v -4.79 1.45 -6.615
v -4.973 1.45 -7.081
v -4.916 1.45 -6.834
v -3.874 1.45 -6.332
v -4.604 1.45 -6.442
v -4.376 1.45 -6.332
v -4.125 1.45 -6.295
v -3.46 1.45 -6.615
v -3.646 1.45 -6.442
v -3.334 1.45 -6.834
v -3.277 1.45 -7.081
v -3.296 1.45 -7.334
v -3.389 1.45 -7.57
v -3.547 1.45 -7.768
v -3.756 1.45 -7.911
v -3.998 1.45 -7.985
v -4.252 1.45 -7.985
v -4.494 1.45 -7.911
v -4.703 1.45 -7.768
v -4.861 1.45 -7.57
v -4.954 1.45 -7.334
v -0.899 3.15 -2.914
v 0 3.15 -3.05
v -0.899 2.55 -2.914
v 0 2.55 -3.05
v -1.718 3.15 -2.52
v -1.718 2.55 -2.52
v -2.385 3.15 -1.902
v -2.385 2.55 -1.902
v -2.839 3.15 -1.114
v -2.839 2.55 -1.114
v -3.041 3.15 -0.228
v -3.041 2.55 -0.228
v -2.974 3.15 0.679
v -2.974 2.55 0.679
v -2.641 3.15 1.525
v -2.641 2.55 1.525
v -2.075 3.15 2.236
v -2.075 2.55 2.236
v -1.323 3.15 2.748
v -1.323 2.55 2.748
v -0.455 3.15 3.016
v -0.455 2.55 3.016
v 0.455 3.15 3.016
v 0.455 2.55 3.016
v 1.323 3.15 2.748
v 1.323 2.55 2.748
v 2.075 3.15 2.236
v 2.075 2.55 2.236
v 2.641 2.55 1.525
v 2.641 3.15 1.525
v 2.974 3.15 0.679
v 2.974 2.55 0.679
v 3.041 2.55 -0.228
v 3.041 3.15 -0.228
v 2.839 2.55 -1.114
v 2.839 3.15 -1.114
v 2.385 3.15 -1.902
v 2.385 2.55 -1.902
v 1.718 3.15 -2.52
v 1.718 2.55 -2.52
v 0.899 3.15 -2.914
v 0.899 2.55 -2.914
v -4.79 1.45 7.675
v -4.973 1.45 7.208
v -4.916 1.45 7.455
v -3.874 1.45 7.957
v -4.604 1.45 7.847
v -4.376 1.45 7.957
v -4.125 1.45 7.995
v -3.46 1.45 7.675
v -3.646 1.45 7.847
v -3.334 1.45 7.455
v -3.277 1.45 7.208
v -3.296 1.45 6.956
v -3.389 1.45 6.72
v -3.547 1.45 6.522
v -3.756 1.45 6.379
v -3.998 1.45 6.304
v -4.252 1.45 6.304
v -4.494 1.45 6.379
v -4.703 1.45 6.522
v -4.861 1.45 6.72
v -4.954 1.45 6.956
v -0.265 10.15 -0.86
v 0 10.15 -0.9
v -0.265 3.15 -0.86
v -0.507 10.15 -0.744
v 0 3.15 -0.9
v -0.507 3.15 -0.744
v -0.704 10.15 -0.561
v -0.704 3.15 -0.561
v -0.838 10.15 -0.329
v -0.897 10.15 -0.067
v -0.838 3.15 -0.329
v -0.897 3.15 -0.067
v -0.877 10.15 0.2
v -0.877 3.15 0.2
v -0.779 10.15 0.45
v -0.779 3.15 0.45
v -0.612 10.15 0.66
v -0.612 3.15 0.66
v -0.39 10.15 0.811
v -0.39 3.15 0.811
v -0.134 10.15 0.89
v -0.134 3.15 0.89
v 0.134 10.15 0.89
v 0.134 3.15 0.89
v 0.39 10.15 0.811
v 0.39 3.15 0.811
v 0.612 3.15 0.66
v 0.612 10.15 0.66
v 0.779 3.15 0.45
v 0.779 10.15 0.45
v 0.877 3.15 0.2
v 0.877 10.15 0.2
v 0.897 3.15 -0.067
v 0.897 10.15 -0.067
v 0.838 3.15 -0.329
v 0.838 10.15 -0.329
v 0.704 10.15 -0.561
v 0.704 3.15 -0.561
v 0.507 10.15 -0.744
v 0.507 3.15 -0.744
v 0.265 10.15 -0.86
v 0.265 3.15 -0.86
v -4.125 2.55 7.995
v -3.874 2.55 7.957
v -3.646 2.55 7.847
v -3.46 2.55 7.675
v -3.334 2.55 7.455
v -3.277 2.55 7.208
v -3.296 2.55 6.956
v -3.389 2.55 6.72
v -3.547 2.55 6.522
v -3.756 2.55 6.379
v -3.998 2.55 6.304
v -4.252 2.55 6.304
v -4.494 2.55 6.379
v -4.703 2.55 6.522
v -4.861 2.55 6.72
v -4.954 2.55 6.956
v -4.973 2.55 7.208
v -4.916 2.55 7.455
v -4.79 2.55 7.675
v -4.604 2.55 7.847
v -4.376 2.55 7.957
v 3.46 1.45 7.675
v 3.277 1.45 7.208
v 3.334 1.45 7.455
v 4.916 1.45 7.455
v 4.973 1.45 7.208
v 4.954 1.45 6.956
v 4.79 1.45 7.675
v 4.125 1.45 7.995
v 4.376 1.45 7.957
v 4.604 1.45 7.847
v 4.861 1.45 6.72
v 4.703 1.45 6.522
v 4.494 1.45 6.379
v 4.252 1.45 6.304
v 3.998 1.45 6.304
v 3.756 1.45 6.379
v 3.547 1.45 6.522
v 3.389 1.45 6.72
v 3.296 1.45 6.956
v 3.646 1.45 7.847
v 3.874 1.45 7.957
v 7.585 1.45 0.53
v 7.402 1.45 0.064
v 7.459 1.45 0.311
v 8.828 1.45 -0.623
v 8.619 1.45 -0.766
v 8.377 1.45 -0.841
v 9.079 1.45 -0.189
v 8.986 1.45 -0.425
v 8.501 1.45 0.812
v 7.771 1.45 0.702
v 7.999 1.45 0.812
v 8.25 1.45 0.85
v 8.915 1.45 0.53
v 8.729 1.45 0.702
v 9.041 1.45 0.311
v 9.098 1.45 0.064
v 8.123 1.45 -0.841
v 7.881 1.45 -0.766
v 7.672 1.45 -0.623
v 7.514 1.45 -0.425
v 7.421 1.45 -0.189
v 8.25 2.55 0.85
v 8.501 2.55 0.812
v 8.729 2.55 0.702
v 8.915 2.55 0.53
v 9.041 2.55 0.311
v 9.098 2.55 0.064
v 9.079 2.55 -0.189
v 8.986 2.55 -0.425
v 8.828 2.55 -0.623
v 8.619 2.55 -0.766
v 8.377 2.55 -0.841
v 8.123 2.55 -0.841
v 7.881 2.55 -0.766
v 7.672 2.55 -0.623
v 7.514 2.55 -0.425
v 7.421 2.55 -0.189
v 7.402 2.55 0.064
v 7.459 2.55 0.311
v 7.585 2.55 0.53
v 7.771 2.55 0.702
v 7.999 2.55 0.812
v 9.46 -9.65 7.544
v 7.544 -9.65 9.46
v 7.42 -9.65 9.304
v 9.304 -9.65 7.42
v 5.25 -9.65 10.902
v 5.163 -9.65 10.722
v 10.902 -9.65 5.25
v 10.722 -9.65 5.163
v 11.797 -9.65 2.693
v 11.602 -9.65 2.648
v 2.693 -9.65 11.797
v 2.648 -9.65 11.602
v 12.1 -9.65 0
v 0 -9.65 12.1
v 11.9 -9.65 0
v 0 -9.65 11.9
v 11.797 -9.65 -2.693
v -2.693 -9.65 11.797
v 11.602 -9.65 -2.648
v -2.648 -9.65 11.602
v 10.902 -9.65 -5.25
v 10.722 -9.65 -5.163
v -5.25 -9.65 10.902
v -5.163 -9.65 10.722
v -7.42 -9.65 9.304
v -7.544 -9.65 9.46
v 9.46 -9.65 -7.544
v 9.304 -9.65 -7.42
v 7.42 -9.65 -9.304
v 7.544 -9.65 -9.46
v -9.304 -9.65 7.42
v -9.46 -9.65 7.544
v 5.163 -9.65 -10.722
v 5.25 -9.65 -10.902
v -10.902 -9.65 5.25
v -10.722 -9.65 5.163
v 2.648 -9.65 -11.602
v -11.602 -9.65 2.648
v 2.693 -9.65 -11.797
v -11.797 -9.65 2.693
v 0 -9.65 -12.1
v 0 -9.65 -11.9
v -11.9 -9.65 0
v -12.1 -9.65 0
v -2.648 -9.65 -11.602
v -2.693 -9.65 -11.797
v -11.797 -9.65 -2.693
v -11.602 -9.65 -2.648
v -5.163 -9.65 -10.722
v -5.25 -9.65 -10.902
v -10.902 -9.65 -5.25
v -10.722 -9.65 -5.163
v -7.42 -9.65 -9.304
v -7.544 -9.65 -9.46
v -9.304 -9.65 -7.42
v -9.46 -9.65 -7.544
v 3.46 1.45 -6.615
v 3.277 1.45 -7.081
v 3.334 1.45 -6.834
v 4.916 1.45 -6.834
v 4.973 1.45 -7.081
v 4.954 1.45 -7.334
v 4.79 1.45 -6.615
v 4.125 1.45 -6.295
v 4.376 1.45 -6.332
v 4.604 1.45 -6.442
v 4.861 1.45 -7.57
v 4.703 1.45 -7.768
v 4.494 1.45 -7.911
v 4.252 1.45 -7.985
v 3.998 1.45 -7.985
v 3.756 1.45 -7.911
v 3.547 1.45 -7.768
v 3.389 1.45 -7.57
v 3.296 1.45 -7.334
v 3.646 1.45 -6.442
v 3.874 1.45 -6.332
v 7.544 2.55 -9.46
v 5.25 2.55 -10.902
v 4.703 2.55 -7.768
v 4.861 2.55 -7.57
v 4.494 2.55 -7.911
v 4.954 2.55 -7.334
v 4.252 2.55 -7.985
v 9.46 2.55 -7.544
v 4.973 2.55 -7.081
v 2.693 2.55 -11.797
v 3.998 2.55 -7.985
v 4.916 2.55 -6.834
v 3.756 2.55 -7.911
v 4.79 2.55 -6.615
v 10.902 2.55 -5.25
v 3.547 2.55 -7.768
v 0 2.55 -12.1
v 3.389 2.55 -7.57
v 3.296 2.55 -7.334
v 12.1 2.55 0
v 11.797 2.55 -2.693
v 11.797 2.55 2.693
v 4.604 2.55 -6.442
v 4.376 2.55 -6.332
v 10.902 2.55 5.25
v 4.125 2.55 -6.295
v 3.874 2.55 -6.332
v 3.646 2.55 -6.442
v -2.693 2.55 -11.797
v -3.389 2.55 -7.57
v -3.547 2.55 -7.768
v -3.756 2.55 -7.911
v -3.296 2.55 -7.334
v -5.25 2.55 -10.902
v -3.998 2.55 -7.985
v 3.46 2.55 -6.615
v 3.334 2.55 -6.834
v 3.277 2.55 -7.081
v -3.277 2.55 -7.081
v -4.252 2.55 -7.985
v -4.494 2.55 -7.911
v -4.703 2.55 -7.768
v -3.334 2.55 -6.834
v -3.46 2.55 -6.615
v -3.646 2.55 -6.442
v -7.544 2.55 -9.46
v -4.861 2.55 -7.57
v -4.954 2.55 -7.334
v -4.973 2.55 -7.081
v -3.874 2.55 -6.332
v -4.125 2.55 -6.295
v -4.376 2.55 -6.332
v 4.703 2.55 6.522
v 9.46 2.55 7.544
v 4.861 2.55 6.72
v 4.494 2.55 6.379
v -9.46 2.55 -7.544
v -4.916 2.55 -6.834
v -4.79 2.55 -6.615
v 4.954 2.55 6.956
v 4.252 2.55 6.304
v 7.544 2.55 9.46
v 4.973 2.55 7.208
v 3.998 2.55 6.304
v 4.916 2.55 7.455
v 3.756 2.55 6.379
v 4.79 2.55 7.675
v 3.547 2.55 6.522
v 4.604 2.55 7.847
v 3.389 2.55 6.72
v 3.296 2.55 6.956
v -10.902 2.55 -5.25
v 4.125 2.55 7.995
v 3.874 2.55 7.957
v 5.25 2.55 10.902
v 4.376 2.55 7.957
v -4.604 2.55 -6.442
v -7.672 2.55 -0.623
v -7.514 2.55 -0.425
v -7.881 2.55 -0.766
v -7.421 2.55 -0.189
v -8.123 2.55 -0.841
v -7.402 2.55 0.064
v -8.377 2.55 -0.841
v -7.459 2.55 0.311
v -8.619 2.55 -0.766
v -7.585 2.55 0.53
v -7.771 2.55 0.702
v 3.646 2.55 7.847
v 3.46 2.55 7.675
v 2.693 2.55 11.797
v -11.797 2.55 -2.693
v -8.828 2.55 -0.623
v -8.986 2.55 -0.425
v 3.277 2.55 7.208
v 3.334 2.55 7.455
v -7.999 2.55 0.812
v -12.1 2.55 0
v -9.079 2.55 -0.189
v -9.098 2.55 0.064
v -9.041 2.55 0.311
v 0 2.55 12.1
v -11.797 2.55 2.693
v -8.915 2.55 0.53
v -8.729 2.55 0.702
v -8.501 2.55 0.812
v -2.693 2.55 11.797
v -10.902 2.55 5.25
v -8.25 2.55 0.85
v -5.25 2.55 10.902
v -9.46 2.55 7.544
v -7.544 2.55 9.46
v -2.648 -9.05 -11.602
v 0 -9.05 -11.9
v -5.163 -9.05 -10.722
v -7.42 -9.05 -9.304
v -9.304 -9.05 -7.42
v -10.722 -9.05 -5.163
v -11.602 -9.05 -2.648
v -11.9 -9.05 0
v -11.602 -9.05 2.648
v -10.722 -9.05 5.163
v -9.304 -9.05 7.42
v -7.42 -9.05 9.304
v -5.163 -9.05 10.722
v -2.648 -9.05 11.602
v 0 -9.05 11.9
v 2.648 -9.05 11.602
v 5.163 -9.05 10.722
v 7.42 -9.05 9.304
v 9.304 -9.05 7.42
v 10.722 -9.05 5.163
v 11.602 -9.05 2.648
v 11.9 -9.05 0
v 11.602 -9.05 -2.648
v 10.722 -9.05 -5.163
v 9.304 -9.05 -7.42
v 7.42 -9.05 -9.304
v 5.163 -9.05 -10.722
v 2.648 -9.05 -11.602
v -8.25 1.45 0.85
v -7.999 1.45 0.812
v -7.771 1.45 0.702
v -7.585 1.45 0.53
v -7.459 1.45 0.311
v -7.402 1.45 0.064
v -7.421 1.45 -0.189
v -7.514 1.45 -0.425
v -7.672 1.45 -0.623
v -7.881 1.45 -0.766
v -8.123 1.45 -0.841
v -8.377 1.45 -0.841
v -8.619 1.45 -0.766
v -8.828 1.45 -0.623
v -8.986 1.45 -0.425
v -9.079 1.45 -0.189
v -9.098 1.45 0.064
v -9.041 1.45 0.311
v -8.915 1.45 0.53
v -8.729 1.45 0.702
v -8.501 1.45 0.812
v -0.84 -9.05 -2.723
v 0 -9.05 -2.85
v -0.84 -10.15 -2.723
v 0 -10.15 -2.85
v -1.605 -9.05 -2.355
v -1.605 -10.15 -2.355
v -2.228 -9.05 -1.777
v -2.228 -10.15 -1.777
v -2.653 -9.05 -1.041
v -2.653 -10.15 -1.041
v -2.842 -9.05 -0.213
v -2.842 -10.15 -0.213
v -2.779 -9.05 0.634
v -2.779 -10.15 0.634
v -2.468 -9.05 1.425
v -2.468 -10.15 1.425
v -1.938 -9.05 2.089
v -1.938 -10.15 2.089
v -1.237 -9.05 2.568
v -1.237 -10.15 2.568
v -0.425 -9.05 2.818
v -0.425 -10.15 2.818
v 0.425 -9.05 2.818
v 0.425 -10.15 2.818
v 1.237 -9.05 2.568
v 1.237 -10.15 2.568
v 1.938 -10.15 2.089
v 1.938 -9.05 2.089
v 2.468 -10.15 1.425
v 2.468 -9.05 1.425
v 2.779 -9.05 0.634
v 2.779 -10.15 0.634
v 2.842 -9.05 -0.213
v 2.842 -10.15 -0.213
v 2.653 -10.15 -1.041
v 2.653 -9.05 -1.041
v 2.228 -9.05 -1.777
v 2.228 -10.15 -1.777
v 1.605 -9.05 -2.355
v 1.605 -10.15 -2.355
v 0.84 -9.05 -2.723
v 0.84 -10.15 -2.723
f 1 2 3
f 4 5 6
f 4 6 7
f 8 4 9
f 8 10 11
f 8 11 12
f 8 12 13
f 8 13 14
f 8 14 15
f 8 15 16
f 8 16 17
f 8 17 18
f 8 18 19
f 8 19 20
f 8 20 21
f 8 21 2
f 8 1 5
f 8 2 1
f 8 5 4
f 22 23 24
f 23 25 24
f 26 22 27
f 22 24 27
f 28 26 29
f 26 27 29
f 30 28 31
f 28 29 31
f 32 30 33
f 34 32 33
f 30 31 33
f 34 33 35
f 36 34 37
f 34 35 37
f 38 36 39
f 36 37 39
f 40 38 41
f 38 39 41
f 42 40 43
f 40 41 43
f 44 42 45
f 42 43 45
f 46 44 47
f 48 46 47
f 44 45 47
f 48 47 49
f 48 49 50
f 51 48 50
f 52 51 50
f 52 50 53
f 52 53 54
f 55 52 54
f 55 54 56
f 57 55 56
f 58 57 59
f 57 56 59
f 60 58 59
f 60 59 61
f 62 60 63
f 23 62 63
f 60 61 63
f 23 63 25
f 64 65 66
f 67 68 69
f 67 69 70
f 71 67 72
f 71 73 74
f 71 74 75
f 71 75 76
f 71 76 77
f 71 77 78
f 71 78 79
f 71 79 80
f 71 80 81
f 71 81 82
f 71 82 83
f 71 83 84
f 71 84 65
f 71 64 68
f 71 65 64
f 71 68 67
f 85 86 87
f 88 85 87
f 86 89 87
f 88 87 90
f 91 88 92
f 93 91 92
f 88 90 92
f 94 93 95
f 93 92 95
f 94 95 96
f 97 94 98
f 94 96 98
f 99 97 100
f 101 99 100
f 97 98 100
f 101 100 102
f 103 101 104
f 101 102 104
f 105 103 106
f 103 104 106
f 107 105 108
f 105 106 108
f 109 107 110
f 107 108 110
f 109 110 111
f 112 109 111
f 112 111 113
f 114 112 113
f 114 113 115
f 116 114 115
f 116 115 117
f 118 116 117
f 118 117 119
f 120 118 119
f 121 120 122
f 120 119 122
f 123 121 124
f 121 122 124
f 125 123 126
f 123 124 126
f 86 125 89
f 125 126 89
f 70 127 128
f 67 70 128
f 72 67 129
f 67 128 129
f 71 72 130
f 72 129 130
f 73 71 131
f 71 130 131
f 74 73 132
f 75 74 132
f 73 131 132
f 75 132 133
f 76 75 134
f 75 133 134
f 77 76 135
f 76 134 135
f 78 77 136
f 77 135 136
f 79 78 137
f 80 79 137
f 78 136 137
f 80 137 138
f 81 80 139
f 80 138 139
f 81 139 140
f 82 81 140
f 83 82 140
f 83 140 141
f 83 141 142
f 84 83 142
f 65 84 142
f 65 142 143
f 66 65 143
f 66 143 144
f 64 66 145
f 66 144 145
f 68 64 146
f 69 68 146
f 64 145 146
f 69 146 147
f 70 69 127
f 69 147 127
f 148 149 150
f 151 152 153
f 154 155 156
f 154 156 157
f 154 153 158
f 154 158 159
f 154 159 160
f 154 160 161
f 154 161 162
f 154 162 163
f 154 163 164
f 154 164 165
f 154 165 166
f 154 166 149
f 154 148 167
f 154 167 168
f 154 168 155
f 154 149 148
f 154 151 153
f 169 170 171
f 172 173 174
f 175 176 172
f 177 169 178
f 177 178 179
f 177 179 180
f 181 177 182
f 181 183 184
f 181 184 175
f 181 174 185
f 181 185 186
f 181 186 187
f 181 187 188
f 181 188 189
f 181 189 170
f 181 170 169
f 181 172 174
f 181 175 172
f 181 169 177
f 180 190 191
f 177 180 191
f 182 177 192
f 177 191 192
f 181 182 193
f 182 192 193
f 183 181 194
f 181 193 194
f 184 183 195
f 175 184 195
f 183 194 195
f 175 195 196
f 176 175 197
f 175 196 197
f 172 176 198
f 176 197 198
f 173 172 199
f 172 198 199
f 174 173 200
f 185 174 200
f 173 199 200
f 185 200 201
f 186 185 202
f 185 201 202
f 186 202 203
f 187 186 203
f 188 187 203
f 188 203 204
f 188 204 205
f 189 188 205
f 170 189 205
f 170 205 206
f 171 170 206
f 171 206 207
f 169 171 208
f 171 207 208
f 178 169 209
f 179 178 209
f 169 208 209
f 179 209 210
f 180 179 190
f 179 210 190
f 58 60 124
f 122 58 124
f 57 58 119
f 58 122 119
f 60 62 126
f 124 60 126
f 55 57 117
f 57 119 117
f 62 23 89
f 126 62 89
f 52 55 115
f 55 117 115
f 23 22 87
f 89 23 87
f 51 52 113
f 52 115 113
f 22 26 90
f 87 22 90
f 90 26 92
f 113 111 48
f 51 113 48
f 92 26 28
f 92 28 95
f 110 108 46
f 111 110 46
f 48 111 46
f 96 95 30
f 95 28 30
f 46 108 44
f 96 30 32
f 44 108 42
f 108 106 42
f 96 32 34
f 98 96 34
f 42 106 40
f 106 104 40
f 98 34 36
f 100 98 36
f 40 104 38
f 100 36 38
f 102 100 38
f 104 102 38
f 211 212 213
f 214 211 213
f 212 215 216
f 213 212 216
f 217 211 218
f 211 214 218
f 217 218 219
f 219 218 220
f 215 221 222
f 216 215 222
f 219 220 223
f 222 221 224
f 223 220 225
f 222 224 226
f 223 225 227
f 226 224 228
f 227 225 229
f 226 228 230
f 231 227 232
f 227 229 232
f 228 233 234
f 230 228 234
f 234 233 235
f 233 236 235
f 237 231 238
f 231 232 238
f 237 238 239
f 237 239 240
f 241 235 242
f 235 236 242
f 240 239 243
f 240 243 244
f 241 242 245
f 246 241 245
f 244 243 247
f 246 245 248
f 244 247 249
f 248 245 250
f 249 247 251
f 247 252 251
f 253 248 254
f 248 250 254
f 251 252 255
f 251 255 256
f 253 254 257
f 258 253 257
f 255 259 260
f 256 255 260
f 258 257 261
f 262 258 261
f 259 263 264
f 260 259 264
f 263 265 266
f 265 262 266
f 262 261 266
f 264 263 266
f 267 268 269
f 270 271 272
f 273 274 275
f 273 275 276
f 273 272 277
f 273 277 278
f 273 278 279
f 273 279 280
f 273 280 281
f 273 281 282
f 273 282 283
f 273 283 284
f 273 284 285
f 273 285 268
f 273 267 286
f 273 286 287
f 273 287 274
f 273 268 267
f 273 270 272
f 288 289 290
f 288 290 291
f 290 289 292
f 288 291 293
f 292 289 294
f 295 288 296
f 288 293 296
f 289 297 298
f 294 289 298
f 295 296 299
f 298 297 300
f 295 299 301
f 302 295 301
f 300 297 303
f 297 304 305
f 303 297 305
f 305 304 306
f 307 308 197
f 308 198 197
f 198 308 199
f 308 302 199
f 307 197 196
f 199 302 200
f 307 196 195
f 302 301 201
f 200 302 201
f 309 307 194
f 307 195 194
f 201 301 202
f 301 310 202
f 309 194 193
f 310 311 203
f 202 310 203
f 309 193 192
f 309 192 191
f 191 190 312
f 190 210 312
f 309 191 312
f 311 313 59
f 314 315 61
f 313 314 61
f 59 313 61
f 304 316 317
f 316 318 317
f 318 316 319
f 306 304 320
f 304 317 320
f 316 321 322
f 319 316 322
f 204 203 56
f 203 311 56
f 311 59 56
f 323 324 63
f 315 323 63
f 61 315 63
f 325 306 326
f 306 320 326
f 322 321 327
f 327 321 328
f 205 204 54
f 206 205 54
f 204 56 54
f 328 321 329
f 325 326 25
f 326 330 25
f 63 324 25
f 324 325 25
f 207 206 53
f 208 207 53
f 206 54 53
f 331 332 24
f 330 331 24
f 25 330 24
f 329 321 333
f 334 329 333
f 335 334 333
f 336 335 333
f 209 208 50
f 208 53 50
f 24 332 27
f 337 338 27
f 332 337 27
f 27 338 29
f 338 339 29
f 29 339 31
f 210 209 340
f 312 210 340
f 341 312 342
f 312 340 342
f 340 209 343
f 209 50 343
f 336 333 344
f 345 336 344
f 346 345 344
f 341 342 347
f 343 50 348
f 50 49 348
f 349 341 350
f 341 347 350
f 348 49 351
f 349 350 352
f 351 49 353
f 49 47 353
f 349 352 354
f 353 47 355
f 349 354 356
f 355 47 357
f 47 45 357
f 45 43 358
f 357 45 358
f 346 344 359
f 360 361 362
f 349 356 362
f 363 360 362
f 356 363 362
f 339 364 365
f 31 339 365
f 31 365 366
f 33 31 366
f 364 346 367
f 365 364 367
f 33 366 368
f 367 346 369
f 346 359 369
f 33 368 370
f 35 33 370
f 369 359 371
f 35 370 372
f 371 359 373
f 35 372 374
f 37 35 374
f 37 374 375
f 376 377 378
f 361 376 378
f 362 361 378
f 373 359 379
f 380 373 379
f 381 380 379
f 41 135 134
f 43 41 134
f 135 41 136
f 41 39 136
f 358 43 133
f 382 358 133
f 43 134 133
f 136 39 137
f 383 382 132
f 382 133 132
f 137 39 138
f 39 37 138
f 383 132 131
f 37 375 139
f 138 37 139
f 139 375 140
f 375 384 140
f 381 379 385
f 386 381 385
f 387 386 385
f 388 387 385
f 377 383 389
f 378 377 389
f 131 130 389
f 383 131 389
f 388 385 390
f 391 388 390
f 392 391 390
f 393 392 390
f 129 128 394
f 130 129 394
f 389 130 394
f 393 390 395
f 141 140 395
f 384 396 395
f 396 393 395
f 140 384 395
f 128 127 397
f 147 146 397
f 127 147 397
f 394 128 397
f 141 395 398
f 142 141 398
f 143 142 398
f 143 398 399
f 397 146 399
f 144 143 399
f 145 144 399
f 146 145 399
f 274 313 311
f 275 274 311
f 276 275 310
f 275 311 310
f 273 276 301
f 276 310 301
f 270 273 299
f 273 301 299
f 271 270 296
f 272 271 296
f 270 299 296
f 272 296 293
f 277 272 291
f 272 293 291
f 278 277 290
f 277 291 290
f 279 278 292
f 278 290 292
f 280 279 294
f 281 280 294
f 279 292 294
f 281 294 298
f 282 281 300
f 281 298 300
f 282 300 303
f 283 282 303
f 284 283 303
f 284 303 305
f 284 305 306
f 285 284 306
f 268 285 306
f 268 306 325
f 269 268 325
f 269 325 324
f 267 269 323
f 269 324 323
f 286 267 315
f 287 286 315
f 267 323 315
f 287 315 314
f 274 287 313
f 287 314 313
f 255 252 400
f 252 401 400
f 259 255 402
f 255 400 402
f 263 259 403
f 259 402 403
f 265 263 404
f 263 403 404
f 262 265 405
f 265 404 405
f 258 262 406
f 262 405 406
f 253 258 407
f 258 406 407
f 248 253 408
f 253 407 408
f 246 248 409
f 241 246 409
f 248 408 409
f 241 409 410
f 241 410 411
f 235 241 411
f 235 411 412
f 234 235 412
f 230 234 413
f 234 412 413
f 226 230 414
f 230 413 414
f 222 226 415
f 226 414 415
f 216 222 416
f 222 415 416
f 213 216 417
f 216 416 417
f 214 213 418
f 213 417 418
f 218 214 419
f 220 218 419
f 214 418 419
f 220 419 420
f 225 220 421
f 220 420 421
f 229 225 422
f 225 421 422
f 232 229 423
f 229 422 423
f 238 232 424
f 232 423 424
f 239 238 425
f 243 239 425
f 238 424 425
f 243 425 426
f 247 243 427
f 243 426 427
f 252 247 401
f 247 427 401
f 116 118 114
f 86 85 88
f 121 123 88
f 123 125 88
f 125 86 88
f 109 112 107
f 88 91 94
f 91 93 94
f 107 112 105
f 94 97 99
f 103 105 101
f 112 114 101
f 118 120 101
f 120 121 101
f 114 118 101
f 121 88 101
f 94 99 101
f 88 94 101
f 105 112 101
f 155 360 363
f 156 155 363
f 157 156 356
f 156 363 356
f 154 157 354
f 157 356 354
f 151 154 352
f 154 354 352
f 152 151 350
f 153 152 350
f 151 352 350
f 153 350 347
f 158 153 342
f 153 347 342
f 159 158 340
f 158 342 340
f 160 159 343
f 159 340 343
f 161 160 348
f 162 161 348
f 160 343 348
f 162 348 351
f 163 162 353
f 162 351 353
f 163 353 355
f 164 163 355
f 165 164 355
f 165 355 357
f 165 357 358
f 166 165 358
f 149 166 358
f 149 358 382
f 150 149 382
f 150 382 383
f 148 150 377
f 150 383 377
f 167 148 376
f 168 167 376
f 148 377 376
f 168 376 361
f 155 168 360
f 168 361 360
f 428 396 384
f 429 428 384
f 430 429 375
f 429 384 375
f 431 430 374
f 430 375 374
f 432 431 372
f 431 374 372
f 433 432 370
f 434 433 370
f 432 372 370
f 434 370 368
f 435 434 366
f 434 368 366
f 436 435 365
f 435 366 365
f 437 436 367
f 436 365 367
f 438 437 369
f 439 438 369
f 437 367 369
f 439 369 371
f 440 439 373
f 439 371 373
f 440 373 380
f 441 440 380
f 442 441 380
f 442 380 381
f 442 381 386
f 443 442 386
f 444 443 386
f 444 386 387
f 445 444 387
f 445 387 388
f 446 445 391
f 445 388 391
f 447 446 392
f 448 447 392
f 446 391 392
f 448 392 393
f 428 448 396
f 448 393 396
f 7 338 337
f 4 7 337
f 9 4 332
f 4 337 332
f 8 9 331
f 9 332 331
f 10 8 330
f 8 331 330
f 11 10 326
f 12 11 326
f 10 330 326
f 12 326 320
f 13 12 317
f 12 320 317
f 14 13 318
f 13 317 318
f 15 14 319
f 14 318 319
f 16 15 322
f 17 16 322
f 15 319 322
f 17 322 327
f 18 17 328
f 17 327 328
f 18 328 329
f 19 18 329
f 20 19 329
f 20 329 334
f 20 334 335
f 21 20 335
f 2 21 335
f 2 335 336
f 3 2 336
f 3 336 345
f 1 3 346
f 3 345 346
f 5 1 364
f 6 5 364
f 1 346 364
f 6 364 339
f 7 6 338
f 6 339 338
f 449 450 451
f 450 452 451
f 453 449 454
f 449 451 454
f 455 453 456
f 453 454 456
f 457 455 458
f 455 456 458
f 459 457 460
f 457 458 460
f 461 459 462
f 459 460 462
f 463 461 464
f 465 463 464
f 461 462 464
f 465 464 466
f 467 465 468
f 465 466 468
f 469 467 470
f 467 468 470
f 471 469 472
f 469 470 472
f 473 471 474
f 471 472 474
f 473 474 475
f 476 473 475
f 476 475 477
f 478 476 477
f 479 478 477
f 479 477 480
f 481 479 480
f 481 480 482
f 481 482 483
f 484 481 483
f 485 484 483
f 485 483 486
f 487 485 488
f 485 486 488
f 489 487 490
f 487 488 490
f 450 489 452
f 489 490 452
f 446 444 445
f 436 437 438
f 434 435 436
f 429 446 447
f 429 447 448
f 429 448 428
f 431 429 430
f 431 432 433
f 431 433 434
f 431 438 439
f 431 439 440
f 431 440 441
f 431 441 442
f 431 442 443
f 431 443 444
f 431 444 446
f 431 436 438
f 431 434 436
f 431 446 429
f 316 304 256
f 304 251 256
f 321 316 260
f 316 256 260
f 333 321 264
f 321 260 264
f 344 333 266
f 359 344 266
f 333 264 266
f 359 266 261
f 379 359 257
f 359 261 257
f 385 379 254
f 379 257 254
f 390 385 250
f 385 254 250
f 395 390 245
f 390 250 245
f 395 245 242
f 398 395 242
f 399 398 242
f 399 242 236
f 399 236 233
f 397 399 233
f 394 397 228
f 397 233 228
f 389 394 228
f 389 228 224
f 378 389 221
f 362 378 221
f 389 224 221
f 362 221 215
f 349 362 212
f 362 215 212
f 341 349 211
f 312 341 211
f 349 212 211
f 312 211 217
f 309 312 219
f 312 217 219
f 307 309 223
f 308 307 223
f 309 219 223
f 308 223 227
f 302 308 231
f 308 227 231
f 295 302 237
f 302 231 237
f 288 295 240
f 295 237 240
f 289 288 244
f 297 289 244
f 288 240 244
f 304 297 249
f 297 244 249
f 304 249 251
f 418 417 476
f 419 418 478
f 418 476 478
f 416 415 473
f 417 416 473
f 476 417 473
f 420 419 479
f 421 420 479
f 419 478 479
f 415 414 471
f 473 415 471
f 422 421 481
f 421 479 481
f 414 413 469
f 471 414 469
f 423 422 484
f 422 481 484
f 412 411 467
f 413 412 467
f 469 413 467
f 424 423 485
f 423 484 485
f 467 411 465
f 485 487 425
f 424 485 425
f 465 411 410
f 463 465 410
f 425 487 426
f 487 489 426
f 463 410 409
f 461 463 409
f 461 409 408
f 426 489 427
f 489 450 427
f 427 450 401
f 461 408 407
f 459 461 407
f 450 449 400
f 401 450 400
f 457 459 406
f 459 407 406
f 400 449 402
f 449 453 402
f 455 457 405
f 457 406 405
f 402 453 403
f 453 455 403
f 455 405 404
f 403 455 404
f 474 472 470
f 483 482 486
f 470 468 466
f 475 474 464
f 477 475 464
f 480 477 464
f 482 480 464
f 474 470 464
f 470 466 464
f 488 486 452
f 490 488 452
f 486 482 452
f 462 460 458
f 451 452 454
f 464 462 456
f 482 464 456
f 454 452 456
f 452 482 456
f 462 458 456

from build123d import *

# Parameters (mm, degrees)
SKETCH2_R          = 0.85
CUT_EXTRUDE1_DEPTH = 1.1


with BuildPart() as part:
    # Sketch1 → Revolve1 (revolve)
    with BuildSketch(Plane.XY, mode=Mode.PRIVATE) as revolve1_sk:
        Polygon((0, -10.15), (0, 10.15), (0.9, 10.15), (0.9, 3.15), (3.05, 3.15), (3.05, 2.55), (12.1, 2.55), (12.1, -9.65), (11.9, -9.65), (11.9, -9.05), (2.85, -9.05), (2.85, -10.15), align=None)
    revolve(revolve1_sk.sketch.rotate(Axis((0, -11.843181818, 0), (0, 1, 0)), 90), axis=Axis((0, -11.843181818, 0), (0, 1, 0)))

    # Sketch2 → Cut-Extrude1 (cut)
    with BuildSketch(Plane(origin=(0, 2.55, 0), x_dir=(1, 0, 0), z_dir=(0, 1, 0))):
        with Locations(Location((-8.25, 0, 0), (0, 0, 270))):
            Circle(SKETCH2_R)
        with Locations(Location((-4.125, 7.144709581, 0), (0, 0, 270))):
            Circle(SKETCH2_R)
        with Locations(Location((4.125, 7.144709581, 0), (0, 0, 270))):
            Circle(SKETCH2_R)
        with Locations(Location((8.25, 0, 0), (0, 0, 270))):
            Circle(SKETCH2_R)
        with Locations(Location((4.125, -7.144709581, 0), (0, 0, 270))):
            Circle(SKETCH2_R)
        with Locations(Location((-4.125, -7.144709581, 0), (0, 0, 270))):
            Circle(SKETCH2_R)
    extrude(amount=-CUT_EXTRUDE1_DEPTH, mode=Mode.SUBTRACT)


solid = part.part
